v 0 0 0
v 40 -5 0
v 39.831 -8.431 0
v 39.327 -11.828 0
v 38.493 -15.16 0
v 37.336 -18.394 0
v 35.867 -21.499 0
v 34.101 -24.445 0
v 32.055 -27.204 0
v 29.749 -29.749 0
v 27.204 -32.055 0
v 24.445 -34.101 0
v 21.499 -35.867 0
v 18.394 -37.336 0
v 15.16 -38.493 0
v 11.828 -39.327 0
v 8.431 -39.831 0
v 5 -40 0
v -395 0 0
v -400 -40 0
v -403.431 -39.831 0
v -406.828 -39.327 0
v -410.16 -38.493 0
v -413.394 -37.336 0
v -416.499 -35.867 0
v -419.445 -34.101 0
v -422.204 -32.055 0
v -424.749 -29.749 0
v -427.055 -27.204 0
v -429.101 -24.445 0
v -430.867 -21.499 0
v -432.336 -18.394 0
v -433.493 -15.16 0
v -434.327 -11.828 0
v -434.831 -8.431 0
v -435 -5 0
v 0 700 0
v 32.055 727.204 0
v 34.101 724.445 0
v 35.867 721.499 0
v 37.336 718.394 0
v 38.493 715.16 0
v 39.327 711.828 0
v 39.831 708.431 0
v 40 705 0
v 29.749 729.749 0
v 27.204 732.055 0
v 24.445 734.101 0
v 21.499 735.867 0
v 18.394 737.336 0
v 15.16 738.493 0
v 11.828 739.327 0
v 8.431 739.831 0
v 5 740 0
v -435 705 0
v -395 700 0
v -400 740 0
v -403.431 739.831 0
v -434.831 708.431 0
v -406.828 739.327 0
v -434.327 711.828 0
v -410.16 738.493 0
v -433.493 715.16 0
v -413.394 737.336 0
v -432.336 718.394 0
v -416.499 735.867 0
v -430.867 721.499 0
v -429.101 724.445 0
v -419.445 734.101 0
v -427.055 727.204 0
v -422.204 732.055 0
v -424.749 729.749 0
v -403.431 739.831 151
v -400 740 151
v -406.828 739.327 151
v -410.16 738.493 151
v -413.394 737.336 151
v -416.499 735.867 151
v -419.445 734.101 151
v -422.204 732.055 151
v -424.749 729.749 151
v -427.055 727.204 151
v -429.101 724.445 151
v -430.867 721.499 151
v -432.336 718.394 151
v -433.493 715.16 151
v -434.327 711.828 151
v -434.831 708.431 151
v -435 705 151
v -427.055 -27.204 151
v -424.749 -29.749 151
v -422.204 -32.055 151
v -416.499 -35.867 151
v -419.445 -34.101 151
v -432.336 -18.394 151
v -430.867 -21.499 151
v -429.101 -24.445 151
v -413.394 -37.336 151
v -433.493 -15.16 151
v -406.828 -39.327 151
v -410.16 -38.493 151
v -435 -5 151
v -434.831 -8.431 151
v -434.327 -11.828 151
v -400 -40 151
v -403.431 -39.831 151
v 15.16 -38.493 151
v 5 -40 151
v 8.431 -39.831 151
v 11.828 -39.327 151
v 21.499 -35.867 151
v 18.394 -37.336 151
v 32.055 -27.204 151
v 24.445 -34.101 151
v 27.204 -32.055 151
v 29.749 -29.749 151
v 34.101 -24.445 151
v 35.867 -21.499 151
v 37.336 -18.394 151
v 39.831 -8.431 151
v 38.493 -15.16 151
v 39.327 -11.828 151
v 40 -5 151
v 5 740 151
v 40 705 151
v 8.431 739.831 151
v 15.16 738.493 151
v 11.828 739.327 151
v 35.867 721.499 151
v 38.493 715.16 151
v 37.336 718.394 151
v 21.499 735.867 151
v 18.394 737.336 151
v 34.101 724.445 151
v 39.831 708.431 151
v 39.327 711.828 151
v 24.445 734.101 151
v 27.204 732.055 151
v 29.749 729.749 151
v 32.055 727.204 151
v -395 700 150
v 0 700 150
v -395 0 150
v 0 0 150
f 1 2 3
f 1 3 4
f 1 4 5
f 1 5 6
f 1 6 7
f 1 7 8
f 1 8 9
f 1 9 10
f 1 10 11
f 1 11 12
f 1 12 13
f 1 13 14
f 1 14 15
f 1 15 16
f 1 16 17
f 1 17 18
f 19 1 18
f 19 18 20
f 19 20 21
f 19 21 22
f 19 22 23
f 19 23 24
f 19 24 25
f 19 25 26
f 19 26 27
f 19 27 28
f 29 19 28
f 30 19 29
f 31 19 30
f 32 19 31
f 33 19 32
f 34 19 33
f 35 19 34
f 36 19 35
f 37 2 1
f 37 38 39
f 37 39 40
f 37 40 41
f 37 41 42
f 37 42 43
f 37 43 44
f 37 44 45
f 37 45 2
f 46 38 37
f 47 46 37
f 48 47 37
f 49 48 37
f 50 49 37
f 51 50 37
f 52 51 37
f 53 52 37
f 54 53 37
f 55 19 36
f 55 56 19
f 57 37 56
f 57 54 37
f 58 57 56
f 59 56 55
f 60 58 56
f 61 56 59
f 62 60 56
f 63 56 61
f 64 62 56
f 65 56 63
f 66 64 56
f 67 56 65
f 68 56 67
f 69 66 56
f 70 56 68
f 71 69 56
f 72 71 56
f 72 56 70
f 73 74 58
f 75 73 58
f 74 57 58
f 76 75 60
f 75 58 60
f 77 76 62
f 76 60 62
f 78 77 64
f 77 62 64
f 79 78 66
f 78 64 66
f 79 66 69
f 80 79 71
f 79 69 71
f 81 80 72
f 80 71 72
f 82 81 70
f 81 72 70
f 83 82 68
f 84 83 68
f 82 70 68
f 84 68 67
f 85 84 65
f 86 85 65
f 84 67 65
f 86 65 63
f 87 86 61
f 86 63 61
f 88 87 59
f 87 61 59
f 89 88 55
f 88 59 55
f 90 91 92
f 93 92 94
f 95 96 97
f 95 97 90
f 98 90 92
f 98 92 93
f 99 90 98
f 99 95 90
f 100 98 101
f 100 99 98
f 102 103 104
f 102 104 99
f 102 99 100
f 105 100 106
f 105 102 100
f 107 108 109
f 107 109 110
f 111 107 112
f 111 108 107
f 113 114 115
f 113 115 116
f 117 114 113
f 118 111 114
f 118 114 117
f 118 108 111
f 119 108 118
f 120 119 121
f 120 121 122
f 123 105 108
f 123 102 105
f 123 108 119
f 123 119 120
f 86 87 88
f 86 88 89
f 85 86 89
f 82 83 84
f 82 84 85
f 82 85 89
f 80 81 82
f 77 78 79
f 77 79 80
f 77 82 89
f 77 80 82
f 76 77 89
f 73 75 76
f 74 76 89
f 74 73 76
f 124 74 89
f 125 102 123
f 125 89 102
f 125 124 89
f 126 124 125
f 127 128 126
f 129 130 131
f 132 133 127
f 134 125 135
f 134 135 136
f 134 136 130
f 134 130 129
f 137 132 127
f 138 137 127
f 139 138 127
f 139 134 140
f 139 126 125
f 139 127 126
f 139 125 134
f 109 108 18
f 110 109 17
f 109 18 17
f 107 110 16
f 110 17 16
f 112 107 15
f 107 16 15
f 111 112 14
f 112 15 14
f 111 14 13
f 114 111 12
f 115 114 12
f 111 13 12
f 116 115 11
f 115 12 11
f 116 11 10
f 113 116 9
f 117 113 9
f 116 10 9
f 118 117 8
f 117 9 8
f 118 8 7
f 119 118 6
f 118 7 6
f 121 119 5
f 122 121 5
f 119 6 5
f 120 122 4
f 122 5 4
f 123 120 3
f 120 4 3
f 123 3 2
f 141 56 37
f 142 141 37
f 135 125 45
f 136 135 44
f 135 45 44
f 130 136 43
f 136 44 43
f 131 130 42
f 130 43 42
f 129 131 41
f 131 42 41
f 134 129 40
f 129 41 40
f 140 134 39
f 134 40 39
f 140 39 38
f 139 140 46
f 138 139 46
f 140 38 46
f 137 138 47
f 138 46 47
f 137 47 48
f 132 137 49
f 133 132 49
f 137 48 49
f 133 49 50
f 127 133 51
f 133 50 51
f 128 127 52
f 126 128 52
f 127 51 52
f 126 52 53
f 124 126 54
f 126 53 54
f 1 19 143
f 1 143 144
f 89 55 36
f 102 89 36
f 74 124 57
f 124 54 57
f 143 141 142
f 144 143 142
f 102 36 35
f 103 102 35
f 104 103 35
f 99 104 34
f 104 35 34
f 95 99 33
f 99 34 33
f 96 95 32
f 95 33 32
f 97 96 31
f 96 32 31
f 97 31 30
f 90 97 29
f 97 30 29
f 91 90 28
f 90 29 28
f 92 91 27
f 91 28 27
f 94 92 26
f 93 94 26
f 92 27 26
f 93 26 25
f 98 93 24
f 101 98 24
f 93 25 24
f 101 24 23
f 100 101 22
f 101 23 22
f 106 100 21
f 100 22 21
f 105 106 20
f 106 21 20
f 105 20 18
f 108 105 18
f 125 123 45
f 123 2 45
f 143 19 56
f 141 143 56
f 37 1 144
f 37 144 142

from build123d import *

# Parameters (mm, degrees)
SKETCH1_W           = 395
SKETCH1_H           = 700
BOSS_EXTRUDE1_DEPTH = 150
BOSS_EXTRUDE2_DEPTH = 1


with BuildPart() as part:
    # Sketch1 → Boss-Extrude1 (new body)
    with BuildSketch(Plane.XY):
        with BuildLine():
            Line((-400, 740), (5, 740))
            ThreePointArc((5, 740), (29.748737342, 729.748737342), (40, 705))
            Line((40, 705), (40, -5))
            ThreePointArc((40, -5), (29.748737342, -29.748737342), (5, -40))
            Line((5, -40), (-400, -40))
            ThreePointArc((-400, -40), (-424.748737342, -29.748737342), (-435, -5))
            Line((-435, -5), (-435, 705))
            ThreePointArc((-435, 705), (-424.748737342, 729.748737342), (-400, 740))
        make_face()
        with Locations((-197.5, 350)):
            Rectangle(SKETCH1_W, SKETCH1_H, mode=Mode.SUBTRACT)
    extrude(amount=BOSS_EXTRUDE1_DEPTH)

    # Sketch2 → Boss-Extrude2 (add)
    with BuildSketch(Plane.XY.offset(150)):
        with BuildLine():
            Line((-400, -40), (5, -40))
            ThreePointArc((5, -40), (29.748737342, -29.748737342), (40, -5))
            Line((40, -5), (40, 705))
            ThreePointArc((40, 705), (29.748737342, 729.748737342), (5, 740))
            Line((5, 740), (-400, 740))
            ThreePointArc((-400, 740), (-424.748737342, 729.748737342), (-435, 705))
            Line((-435, 705), (-435, -5))
            ThreePointArc((-435, -5), (-424.748737342, -29.748737342), (-400, -40))
        make_face()
    extrude(amount=BOSS_EXTRUDE2_DEPTH)


solid = part.part
